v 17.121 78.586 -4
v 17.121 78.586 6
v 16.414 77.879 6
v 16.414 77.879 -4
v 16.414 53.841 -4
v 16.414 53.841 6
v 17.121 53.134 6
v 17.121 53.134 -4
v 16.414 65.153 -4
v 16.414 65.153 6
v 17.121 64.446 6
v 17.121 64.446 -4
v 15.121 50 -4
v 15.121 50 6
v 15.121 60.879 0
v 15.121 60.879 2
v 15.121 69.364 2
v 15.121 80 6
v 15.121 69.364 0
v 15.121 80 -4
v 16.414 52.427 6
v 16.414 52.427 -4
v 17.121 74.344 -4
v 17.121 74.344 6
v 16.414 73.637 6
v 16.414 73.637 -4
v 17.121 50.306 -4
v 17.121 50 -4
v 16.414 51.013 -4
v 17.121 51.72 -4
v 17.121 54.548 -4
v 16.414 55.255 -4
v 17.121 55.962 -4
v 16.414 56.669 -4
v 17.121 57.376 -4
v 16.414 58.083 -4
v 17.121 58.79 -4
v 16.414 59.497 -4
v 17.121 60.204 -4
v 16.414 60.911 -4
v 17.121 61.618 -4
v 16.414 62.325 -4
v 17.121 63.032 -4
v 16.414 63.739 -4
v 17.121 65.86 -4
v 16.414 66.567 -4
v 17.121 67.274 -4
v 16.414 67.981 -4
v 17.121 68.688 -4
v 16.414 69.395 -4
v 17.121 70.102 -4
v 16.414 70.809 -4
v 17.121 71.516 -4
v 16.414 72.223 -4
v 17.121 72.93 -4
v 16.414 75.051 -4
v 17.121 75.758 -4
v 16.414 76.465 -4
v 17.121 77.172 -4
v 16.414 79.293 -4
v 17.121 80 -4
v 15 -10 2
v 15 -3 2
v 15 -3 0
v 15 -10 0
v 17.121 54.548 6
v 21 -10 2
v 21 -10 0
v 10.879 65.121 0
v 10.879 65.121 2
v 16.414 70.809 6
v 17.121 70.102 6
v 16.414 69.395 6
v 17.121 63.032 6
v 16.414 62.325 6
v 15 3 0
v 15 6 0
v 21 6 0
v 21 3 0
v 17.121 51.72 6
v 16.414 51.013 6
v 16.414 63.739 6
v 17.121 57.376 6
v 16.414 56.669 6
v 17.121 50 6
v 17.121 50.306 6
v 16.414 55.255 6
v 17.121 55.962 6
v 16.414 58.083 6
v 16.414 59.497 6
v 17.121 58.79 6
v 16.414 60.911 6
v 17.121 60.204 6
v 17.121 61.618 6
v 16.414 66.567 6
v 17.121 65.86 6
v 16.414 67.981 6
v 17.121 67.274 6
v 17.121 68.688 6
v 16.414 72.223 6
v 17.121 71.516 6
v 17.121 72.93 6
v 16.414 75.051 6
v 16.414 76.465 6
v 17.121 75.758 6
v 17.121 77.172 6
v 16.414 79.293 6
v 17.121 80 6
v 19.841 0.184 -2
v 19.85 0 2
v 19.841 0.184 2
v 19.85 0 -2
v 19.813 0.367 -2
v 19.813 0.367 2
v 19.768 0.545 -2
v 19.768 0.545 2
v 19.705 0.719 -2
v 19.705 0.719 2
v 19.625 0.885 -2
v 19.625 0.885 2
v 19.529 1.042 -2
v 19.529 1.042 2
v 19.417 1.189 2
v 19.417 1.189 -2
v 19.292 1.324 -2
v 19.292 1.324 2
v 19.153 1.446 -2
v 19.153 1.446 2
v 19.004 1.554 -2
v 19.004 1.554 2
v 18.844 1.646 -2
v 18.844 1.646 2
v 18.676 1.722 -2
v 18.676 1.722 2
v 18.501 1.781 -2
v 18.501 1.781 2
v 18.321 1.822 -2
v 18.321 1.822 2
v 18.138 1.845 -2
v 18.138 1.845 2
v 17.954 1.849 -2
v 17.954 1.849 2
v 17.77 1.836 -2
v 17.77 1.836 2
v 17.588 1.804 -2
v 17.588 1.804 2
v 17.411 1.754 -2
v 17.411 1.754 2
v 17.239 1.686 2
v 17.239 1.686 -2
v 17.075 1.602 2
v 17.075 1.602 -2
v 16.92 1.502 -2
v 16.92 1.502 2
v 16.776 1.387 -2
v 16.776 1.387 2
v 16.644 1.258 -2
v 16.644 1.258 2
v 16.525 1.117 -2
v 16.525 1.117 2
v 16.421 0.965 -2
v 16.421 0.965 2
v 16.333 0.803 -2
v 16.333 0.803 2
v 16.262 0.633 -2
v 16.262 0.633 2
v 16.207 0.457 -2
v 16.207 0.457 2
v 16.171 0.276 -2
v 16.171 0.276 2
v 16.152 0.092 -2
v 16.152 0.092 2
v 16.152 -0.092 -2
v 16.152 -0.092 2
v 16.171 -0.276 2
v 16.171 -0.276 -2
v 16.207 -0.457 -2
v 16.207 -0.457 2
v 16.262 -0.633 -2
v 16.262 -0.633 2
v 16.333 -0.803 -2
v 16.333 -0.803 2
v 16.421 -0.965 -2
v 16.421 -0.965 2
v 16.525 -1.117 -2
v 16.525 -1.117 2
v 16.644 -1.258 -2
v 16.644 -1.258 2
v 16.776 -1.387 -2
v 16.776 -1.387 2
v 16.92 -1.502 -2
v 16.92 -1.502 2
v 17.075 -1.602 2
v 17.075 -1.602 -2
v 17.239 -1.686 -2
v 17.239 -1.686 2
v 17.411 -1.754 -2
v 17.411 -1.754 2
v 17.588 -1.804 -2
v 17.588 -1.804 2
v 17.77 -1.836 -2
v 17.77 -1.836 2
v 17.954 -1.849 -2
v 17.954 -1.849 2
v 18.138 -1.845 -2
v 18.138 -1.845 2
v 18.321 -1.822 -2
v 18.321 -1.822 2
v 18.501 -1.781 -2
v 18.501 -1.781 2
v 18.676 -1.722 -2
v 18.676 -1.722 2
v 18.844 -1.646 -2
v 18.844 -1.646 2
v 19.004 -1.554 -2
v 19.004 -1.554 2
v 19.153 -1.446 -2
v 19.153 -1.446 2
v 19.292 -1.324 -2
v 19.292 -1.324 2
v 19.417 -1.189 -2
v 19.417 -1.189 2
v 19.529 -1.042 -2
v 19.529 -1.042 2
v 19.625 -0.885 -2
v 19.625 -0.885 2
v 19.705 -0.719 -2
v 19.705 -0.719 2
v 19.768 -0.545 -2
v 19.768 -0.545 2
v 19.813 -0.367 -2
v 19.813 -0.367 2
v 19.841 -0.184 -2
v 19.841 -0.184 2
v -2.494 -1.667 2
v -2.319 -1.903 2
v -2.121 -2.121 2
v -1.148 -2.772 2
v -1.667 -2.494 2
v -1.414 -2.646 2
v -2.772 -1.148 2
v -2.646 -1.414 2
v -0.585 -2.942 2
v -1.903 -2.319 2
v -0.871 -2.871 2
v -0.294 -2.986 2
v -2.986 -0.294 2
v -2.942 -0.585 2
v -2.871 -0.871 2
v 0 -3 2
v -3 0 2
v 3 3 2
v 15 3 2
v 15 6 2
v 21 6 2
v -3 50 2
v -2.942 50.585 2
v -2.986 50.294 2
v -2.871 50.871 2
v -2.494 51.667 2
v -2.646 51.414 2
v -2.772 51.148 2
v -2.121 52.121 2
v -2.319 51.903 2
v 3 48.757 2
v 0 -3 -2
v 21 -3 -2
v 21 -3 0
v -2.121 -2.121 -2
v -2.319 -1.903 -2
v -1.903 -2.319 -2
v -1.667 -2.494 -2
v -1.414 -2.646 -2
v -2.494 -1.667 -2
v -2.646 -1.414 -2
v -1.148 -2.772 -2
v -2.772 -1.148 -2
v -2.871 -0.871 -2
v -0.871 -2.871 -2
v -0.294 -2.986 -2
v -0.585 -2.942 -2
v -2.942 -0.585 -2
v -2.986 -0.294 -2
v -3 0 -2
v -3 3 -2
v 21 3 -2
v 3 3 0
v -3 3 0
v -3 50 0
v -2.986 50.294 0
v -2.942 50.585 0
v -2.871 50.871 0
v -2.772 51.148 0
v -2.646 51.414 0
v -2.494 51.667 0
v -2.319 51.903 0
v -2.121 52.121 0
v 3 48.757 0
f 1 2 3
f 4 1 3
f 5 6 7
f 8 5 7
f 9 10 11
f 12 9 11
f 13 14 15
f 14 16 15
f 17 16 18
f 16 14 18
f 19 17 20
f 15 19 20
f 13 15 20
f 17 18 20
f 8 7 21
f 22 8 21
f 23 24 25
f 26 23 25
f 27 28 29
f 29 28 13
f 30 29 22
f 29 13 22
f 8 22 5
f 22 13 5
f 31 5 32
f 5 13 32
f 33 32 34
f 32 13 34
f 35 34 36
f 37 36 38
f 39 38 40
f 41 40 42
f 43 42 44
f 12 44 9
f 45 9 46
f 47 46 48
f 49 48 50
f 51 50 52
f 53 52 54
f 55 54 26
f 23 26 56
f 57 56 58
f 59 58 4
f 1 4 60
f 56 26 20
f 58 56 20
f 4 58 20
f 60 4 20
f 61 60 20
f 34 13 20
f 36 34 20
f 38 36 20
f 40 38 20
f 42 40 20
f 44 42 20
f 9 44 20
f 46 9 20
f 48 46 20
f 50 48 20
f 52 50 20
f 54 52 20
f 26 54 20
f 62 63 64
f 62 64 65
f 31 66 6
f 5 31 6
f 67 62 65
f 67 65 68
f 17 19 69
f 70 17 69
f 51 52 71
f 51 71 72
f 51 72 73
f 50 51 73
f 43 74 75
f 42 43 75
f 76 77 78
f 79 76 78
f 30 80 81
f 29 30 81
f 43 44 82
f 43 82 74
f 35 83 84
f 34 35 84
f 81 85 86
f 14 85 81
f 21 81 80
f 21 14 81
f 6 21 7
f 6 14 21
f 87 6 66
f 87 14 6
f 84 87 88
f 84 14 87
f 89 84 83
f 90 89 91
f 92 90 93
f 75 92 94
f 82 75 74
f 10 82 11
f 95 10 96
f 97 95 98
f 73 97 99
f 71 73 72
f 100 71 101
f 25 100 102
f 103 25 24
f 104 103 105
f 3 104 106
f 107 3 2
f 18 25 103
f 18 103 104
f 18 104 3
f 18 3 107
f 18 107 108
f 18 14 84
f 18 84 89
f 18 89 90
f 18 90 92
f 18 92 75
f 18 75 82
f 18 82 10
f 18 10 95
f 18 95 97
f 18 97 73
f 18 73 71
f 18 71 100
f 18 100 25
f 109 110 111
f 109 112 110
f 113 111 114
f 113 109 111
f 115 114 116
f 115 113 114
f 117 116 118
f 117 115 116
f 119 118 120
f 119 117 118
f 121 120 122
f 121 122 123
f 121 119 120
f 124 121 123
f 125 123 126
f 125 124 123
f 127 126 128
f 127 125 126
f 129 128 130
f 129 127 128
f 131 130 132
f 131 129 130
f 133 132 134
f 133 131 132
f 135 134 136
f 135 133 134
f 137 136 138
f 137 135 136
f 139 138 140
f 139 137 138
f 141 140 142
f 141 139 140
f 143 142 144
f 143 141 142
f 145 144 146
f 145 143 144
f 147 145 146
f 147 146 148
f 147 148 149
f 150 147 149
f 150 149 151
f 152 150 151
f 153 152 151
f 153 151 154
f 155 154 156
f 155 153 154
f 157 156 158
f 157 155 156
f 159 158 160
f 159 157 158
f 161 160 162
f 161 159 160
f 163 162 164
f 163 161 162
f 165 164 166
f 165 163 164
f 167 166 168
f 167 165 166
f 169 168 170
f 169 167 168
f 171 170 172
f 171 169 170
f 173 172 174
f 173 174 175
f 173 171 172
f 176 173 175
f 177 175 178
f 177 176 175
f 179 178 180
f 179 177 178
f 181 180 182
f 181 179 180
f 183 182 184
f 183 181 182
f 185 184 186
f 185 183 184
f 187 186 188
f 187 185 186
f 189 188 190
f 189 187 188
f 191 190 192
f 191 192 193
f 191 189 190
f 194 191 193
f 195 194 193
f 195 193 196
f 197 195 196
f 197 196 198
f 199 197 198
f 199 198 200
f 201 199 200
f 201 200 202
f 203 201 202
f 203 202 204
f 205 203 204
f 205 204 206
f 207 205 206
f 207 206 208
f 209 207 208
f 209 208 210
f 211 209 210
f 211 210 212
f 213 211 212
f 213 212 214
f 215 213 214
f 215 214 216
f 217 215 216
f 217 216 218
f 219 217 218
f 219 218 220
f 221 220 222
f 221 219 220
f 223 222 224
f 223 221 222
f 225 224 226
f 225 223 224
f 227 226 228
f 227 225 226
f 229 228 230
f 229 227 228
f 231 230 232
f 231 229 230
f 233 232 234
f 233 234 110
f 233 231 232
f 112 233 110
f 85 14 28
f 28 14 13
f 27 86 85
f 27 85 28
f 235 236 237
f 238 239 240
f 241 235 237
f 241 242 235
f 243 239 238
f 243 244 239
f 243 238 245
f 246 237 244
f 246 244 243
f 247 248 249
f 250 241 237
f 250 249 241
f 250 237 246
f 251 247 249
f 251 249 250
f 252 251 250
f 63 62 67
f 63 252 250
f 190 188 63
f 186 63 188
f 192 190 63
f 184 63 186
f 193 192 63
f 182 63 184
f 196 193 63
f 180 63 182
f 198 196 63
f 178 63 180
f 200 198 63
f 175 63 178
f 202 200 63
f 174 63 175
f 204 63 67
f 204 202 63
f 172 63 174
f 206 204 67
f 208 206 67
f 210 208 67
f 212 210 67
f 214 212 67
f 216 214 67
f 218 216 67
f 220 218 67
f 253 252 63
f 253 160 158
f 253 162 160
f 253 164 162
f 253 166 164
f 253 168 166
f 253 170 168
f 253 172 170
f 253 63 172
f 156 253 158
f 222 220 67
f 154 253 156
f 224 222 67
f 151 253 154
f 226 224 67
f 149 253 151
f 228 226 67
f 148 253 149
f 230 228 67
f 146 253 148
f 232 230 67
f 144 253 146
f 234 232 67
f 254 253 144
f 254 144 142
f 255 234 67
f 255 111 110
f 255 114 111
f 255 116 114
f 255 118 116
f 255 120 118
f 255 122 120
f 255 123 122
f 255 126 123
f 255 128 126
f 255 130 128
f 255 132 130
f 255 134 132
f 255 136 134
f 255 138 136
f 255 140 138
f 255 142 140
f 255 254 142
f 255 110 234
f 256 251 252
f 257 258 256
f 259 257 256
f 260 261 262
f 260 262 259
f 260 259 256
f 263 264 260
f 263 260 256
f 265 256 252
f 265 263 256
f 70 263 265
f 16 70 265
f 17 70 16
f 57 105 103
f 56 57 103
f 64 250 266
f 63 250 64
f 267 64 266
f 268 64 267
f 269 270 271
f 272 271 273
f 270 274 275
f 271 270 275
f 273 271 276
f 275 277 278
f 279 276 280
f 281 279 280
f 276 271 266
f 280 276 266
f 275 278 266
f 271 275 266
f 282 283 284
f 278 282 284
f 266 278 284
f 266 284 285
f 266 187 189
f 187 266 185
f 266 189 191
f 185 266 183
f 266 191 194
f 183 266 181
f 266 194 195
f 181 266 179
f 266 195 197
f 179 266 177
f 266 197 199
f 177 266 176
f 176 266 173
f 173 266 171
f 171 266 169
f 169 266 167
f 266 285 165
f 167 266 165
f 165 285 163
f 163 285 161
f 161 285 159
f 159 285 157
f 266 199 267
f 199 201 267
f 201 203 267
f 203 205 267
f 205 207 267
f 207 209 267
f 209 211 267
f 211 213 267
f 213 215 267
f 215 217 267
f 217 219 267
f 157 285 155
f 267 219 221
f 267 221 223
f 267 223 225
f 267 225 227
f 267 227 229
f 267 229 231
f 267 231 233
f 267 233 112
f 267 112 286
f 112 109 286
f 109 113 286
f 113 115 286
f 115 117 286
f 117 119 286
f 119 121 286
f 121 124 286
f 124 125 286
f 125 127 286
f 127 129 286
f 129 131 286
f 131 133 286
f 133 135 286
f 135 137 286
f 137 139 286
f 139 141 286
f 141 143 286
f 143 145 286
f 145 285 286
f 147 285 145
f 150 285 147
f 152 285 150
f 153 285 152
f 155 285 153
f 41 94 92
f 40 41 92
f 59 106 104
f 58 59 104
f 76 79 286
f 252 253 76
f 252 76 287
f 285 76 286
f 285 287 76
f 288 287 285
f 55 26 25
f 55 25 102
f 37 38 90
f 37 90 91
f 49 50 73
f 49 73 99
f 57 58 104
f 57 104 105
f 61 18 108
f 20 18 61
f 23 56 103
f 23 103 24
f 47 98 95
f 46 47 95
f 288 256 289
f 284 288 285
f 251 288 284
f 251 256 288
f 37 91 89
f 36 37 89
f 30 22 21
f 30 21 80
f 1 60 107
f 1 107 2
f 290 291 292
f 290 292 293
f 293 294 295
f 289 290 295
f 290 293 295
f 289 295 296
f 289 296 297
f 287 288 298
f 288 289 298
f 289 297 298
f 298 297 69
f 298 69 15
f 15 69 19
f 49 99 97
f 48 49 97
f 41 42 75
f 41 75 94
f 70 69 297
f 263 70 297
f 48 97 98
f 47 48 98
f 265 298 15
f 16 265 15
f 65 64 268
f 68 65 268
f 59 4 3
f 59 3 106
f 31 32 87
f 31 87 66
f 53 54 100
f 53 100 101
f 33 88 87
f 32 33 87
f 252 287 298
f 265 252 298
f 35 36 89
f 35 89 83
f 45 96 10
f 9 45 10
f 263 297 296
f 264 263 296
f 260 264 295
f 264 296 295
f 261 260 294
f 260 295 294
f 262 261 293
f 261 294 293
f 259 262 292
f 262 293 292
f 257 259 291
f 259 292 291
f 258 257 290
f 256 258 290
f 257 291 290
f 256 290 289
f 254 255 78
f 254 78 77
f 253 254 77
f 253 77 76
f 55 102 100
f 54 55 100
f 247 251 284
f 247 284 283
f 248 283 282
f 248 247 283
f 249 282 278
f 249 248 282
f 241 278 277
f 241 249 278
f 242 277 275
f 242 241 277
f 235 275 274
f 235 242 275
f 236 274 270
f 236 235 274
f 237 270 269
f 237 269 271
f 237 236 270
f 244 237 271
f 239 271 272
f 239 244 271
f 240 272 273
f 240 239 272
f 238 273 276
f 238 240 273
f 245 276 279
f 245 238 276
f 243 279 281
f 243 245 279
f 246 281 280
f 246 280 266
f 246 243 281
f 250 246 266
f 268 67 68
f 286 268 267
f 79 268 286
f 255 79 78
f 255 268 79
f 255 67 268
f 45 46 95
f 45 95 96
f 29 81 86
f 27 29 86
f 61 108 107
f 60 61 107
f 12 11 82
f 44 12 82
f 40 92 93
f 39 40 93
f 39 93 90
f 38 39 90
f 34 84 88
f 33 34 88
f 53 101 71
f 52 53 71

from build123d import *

# Parameters (mm, degrees)
SKETCH_1_R             = 1.85
EXTRUDE_1_DEPTH        = 2
CUT_EXTRUDE_START      = -4
SKETCH_4_W             = 6
SKETCH_4_H             = 3
SKETCH_4_H_2           = 7
CUT_EXTRUDE_2_DEPTH    = 2
EXTRUDE_2_DEPTH        = 2
SKETCH_5_W             = 10
SKETCH_5_H             = 30
EXTRUDE_3_DEPTH        = 2
CUT_EXTRUDE_3_DEPTH    = 10
PATTERN_LINEAR_1_COUNT = 21
PATTERN_LINEAR_1_PITCH = 1.414


with BuildPart() as part:
    # 草图1 → 凸台-拉伸1 (new, symmetric)
    with BuildSketch(Plane.XY):
        with BuildLine():
            Line((20, 6), (16, 6))
            Line((16, 6), (15, 6))
            Line((15, 6), (15, 3))
            Line((15, 3), (3, 3))
            Line((3, 3), (-3, 3))
            Line((-3, 3), (-3, 0))
            ThreePointArc((-3, 0), (-2.121320344, -2.121320344), (0, -3))
            Line((0, -3), (15, -3))
            Line((15, -3), (15, -10))
            Line((15, -10), (16, -10))
            Line((16, -10), (20, -10))
            Line((20, -10), (20.5, -10))
            Line((20.5, -10), (21, -10))
            Line((21, -10), (21, -3))
            Line((21, -3), (21, 3))
            Line((21, 3), (21, 6))
            Line((21, 6), (20, 6))
        make_face()
        with Locations((18, 0)):
            Circle(SKETCH_1_R, mode=Mode.SUBTRACT)
    extrude(amount=EXTRUDE_1_DEPTH, both=True)

    # 草图4 → 切除-拉伸2 (cut)
    with BuildSketch(Plane.XY.offset(2).offset(CUT_EXTRUDE_START)):
        with Locations((18, 4.5)):
            Rectangle(SKETCH_4_W, SKETCH_4_H)
        with Locations((18, -6.5)):
            Rectangle(SKETCH_4_W, SKETCH_4_H_2)
    extrude(amount=CUT_EXTRUDE_2_DEPTH, mode=Mode.SUBTRACT)

    # 草图1<3> → 凸台-拉伸2 (add)
    with BuildSketch(Plane.XY):
        with BuildLine():
            Line((-3, 3), (3, 3))
            Line((3, 3), (3, 48.757359313))
            Line((3, 48.757359313), (15.121320344, 60.878679656))
            Line((15.121320344, 60.878679656), (15.121320344, 69.363961031))
            Line((15.121320344, 69.363961031), (10.878679656, 65.121320344))
            Line((10.878679656, 65.121320344), (-2.121320344, 52.121320344))
            ThreePointArc((-2.121320344, 52.121320344), (-2.771638598, 51.148050297), (-3, 50))
            Line((-3, 50), (-3, 3))
        make_face()
    extrude(amount=EXTRUDE_2_DEPTH)

    # 草图5 → 凸台-拉伸3 (add)
    with BuildSketch(Plane(origin=(15.121320344, 0, 0), x_dir=(0, 0, -1), z_dir=(1, 0, 0))):
        with Locations((-1, 65)):
            Rectangle(SKETCH_5_W, SKETCH_5_H)
    extrude(amount=EXTRUDE_3_DEPTH)

    # 草图6 → 切除-拉伸3 (cut)
    with BuildSketch(Plane.XY.offset(6)):
        Polygon((17.121320344, 80), (16.414213562, 79.292893219), (17.121320344, 78.585786438), align=None)
    cut_extrude_3 = extrude(amount=-CUT_EXTRUDE_3_DEPTH, mode=Mode.SUBTRACT)

    # 阵列(线性)1: 切除-拉伸3 ×21
    with Locations(*[(0, -i * PATTERN_LINEAR_1_PITCH, 0) for i in range(1, PATTERN_LINEAR_1_COUNT)]):
        add(cut_extrude_3, mode=Mode.SUBTRACT)


solid = part.part
